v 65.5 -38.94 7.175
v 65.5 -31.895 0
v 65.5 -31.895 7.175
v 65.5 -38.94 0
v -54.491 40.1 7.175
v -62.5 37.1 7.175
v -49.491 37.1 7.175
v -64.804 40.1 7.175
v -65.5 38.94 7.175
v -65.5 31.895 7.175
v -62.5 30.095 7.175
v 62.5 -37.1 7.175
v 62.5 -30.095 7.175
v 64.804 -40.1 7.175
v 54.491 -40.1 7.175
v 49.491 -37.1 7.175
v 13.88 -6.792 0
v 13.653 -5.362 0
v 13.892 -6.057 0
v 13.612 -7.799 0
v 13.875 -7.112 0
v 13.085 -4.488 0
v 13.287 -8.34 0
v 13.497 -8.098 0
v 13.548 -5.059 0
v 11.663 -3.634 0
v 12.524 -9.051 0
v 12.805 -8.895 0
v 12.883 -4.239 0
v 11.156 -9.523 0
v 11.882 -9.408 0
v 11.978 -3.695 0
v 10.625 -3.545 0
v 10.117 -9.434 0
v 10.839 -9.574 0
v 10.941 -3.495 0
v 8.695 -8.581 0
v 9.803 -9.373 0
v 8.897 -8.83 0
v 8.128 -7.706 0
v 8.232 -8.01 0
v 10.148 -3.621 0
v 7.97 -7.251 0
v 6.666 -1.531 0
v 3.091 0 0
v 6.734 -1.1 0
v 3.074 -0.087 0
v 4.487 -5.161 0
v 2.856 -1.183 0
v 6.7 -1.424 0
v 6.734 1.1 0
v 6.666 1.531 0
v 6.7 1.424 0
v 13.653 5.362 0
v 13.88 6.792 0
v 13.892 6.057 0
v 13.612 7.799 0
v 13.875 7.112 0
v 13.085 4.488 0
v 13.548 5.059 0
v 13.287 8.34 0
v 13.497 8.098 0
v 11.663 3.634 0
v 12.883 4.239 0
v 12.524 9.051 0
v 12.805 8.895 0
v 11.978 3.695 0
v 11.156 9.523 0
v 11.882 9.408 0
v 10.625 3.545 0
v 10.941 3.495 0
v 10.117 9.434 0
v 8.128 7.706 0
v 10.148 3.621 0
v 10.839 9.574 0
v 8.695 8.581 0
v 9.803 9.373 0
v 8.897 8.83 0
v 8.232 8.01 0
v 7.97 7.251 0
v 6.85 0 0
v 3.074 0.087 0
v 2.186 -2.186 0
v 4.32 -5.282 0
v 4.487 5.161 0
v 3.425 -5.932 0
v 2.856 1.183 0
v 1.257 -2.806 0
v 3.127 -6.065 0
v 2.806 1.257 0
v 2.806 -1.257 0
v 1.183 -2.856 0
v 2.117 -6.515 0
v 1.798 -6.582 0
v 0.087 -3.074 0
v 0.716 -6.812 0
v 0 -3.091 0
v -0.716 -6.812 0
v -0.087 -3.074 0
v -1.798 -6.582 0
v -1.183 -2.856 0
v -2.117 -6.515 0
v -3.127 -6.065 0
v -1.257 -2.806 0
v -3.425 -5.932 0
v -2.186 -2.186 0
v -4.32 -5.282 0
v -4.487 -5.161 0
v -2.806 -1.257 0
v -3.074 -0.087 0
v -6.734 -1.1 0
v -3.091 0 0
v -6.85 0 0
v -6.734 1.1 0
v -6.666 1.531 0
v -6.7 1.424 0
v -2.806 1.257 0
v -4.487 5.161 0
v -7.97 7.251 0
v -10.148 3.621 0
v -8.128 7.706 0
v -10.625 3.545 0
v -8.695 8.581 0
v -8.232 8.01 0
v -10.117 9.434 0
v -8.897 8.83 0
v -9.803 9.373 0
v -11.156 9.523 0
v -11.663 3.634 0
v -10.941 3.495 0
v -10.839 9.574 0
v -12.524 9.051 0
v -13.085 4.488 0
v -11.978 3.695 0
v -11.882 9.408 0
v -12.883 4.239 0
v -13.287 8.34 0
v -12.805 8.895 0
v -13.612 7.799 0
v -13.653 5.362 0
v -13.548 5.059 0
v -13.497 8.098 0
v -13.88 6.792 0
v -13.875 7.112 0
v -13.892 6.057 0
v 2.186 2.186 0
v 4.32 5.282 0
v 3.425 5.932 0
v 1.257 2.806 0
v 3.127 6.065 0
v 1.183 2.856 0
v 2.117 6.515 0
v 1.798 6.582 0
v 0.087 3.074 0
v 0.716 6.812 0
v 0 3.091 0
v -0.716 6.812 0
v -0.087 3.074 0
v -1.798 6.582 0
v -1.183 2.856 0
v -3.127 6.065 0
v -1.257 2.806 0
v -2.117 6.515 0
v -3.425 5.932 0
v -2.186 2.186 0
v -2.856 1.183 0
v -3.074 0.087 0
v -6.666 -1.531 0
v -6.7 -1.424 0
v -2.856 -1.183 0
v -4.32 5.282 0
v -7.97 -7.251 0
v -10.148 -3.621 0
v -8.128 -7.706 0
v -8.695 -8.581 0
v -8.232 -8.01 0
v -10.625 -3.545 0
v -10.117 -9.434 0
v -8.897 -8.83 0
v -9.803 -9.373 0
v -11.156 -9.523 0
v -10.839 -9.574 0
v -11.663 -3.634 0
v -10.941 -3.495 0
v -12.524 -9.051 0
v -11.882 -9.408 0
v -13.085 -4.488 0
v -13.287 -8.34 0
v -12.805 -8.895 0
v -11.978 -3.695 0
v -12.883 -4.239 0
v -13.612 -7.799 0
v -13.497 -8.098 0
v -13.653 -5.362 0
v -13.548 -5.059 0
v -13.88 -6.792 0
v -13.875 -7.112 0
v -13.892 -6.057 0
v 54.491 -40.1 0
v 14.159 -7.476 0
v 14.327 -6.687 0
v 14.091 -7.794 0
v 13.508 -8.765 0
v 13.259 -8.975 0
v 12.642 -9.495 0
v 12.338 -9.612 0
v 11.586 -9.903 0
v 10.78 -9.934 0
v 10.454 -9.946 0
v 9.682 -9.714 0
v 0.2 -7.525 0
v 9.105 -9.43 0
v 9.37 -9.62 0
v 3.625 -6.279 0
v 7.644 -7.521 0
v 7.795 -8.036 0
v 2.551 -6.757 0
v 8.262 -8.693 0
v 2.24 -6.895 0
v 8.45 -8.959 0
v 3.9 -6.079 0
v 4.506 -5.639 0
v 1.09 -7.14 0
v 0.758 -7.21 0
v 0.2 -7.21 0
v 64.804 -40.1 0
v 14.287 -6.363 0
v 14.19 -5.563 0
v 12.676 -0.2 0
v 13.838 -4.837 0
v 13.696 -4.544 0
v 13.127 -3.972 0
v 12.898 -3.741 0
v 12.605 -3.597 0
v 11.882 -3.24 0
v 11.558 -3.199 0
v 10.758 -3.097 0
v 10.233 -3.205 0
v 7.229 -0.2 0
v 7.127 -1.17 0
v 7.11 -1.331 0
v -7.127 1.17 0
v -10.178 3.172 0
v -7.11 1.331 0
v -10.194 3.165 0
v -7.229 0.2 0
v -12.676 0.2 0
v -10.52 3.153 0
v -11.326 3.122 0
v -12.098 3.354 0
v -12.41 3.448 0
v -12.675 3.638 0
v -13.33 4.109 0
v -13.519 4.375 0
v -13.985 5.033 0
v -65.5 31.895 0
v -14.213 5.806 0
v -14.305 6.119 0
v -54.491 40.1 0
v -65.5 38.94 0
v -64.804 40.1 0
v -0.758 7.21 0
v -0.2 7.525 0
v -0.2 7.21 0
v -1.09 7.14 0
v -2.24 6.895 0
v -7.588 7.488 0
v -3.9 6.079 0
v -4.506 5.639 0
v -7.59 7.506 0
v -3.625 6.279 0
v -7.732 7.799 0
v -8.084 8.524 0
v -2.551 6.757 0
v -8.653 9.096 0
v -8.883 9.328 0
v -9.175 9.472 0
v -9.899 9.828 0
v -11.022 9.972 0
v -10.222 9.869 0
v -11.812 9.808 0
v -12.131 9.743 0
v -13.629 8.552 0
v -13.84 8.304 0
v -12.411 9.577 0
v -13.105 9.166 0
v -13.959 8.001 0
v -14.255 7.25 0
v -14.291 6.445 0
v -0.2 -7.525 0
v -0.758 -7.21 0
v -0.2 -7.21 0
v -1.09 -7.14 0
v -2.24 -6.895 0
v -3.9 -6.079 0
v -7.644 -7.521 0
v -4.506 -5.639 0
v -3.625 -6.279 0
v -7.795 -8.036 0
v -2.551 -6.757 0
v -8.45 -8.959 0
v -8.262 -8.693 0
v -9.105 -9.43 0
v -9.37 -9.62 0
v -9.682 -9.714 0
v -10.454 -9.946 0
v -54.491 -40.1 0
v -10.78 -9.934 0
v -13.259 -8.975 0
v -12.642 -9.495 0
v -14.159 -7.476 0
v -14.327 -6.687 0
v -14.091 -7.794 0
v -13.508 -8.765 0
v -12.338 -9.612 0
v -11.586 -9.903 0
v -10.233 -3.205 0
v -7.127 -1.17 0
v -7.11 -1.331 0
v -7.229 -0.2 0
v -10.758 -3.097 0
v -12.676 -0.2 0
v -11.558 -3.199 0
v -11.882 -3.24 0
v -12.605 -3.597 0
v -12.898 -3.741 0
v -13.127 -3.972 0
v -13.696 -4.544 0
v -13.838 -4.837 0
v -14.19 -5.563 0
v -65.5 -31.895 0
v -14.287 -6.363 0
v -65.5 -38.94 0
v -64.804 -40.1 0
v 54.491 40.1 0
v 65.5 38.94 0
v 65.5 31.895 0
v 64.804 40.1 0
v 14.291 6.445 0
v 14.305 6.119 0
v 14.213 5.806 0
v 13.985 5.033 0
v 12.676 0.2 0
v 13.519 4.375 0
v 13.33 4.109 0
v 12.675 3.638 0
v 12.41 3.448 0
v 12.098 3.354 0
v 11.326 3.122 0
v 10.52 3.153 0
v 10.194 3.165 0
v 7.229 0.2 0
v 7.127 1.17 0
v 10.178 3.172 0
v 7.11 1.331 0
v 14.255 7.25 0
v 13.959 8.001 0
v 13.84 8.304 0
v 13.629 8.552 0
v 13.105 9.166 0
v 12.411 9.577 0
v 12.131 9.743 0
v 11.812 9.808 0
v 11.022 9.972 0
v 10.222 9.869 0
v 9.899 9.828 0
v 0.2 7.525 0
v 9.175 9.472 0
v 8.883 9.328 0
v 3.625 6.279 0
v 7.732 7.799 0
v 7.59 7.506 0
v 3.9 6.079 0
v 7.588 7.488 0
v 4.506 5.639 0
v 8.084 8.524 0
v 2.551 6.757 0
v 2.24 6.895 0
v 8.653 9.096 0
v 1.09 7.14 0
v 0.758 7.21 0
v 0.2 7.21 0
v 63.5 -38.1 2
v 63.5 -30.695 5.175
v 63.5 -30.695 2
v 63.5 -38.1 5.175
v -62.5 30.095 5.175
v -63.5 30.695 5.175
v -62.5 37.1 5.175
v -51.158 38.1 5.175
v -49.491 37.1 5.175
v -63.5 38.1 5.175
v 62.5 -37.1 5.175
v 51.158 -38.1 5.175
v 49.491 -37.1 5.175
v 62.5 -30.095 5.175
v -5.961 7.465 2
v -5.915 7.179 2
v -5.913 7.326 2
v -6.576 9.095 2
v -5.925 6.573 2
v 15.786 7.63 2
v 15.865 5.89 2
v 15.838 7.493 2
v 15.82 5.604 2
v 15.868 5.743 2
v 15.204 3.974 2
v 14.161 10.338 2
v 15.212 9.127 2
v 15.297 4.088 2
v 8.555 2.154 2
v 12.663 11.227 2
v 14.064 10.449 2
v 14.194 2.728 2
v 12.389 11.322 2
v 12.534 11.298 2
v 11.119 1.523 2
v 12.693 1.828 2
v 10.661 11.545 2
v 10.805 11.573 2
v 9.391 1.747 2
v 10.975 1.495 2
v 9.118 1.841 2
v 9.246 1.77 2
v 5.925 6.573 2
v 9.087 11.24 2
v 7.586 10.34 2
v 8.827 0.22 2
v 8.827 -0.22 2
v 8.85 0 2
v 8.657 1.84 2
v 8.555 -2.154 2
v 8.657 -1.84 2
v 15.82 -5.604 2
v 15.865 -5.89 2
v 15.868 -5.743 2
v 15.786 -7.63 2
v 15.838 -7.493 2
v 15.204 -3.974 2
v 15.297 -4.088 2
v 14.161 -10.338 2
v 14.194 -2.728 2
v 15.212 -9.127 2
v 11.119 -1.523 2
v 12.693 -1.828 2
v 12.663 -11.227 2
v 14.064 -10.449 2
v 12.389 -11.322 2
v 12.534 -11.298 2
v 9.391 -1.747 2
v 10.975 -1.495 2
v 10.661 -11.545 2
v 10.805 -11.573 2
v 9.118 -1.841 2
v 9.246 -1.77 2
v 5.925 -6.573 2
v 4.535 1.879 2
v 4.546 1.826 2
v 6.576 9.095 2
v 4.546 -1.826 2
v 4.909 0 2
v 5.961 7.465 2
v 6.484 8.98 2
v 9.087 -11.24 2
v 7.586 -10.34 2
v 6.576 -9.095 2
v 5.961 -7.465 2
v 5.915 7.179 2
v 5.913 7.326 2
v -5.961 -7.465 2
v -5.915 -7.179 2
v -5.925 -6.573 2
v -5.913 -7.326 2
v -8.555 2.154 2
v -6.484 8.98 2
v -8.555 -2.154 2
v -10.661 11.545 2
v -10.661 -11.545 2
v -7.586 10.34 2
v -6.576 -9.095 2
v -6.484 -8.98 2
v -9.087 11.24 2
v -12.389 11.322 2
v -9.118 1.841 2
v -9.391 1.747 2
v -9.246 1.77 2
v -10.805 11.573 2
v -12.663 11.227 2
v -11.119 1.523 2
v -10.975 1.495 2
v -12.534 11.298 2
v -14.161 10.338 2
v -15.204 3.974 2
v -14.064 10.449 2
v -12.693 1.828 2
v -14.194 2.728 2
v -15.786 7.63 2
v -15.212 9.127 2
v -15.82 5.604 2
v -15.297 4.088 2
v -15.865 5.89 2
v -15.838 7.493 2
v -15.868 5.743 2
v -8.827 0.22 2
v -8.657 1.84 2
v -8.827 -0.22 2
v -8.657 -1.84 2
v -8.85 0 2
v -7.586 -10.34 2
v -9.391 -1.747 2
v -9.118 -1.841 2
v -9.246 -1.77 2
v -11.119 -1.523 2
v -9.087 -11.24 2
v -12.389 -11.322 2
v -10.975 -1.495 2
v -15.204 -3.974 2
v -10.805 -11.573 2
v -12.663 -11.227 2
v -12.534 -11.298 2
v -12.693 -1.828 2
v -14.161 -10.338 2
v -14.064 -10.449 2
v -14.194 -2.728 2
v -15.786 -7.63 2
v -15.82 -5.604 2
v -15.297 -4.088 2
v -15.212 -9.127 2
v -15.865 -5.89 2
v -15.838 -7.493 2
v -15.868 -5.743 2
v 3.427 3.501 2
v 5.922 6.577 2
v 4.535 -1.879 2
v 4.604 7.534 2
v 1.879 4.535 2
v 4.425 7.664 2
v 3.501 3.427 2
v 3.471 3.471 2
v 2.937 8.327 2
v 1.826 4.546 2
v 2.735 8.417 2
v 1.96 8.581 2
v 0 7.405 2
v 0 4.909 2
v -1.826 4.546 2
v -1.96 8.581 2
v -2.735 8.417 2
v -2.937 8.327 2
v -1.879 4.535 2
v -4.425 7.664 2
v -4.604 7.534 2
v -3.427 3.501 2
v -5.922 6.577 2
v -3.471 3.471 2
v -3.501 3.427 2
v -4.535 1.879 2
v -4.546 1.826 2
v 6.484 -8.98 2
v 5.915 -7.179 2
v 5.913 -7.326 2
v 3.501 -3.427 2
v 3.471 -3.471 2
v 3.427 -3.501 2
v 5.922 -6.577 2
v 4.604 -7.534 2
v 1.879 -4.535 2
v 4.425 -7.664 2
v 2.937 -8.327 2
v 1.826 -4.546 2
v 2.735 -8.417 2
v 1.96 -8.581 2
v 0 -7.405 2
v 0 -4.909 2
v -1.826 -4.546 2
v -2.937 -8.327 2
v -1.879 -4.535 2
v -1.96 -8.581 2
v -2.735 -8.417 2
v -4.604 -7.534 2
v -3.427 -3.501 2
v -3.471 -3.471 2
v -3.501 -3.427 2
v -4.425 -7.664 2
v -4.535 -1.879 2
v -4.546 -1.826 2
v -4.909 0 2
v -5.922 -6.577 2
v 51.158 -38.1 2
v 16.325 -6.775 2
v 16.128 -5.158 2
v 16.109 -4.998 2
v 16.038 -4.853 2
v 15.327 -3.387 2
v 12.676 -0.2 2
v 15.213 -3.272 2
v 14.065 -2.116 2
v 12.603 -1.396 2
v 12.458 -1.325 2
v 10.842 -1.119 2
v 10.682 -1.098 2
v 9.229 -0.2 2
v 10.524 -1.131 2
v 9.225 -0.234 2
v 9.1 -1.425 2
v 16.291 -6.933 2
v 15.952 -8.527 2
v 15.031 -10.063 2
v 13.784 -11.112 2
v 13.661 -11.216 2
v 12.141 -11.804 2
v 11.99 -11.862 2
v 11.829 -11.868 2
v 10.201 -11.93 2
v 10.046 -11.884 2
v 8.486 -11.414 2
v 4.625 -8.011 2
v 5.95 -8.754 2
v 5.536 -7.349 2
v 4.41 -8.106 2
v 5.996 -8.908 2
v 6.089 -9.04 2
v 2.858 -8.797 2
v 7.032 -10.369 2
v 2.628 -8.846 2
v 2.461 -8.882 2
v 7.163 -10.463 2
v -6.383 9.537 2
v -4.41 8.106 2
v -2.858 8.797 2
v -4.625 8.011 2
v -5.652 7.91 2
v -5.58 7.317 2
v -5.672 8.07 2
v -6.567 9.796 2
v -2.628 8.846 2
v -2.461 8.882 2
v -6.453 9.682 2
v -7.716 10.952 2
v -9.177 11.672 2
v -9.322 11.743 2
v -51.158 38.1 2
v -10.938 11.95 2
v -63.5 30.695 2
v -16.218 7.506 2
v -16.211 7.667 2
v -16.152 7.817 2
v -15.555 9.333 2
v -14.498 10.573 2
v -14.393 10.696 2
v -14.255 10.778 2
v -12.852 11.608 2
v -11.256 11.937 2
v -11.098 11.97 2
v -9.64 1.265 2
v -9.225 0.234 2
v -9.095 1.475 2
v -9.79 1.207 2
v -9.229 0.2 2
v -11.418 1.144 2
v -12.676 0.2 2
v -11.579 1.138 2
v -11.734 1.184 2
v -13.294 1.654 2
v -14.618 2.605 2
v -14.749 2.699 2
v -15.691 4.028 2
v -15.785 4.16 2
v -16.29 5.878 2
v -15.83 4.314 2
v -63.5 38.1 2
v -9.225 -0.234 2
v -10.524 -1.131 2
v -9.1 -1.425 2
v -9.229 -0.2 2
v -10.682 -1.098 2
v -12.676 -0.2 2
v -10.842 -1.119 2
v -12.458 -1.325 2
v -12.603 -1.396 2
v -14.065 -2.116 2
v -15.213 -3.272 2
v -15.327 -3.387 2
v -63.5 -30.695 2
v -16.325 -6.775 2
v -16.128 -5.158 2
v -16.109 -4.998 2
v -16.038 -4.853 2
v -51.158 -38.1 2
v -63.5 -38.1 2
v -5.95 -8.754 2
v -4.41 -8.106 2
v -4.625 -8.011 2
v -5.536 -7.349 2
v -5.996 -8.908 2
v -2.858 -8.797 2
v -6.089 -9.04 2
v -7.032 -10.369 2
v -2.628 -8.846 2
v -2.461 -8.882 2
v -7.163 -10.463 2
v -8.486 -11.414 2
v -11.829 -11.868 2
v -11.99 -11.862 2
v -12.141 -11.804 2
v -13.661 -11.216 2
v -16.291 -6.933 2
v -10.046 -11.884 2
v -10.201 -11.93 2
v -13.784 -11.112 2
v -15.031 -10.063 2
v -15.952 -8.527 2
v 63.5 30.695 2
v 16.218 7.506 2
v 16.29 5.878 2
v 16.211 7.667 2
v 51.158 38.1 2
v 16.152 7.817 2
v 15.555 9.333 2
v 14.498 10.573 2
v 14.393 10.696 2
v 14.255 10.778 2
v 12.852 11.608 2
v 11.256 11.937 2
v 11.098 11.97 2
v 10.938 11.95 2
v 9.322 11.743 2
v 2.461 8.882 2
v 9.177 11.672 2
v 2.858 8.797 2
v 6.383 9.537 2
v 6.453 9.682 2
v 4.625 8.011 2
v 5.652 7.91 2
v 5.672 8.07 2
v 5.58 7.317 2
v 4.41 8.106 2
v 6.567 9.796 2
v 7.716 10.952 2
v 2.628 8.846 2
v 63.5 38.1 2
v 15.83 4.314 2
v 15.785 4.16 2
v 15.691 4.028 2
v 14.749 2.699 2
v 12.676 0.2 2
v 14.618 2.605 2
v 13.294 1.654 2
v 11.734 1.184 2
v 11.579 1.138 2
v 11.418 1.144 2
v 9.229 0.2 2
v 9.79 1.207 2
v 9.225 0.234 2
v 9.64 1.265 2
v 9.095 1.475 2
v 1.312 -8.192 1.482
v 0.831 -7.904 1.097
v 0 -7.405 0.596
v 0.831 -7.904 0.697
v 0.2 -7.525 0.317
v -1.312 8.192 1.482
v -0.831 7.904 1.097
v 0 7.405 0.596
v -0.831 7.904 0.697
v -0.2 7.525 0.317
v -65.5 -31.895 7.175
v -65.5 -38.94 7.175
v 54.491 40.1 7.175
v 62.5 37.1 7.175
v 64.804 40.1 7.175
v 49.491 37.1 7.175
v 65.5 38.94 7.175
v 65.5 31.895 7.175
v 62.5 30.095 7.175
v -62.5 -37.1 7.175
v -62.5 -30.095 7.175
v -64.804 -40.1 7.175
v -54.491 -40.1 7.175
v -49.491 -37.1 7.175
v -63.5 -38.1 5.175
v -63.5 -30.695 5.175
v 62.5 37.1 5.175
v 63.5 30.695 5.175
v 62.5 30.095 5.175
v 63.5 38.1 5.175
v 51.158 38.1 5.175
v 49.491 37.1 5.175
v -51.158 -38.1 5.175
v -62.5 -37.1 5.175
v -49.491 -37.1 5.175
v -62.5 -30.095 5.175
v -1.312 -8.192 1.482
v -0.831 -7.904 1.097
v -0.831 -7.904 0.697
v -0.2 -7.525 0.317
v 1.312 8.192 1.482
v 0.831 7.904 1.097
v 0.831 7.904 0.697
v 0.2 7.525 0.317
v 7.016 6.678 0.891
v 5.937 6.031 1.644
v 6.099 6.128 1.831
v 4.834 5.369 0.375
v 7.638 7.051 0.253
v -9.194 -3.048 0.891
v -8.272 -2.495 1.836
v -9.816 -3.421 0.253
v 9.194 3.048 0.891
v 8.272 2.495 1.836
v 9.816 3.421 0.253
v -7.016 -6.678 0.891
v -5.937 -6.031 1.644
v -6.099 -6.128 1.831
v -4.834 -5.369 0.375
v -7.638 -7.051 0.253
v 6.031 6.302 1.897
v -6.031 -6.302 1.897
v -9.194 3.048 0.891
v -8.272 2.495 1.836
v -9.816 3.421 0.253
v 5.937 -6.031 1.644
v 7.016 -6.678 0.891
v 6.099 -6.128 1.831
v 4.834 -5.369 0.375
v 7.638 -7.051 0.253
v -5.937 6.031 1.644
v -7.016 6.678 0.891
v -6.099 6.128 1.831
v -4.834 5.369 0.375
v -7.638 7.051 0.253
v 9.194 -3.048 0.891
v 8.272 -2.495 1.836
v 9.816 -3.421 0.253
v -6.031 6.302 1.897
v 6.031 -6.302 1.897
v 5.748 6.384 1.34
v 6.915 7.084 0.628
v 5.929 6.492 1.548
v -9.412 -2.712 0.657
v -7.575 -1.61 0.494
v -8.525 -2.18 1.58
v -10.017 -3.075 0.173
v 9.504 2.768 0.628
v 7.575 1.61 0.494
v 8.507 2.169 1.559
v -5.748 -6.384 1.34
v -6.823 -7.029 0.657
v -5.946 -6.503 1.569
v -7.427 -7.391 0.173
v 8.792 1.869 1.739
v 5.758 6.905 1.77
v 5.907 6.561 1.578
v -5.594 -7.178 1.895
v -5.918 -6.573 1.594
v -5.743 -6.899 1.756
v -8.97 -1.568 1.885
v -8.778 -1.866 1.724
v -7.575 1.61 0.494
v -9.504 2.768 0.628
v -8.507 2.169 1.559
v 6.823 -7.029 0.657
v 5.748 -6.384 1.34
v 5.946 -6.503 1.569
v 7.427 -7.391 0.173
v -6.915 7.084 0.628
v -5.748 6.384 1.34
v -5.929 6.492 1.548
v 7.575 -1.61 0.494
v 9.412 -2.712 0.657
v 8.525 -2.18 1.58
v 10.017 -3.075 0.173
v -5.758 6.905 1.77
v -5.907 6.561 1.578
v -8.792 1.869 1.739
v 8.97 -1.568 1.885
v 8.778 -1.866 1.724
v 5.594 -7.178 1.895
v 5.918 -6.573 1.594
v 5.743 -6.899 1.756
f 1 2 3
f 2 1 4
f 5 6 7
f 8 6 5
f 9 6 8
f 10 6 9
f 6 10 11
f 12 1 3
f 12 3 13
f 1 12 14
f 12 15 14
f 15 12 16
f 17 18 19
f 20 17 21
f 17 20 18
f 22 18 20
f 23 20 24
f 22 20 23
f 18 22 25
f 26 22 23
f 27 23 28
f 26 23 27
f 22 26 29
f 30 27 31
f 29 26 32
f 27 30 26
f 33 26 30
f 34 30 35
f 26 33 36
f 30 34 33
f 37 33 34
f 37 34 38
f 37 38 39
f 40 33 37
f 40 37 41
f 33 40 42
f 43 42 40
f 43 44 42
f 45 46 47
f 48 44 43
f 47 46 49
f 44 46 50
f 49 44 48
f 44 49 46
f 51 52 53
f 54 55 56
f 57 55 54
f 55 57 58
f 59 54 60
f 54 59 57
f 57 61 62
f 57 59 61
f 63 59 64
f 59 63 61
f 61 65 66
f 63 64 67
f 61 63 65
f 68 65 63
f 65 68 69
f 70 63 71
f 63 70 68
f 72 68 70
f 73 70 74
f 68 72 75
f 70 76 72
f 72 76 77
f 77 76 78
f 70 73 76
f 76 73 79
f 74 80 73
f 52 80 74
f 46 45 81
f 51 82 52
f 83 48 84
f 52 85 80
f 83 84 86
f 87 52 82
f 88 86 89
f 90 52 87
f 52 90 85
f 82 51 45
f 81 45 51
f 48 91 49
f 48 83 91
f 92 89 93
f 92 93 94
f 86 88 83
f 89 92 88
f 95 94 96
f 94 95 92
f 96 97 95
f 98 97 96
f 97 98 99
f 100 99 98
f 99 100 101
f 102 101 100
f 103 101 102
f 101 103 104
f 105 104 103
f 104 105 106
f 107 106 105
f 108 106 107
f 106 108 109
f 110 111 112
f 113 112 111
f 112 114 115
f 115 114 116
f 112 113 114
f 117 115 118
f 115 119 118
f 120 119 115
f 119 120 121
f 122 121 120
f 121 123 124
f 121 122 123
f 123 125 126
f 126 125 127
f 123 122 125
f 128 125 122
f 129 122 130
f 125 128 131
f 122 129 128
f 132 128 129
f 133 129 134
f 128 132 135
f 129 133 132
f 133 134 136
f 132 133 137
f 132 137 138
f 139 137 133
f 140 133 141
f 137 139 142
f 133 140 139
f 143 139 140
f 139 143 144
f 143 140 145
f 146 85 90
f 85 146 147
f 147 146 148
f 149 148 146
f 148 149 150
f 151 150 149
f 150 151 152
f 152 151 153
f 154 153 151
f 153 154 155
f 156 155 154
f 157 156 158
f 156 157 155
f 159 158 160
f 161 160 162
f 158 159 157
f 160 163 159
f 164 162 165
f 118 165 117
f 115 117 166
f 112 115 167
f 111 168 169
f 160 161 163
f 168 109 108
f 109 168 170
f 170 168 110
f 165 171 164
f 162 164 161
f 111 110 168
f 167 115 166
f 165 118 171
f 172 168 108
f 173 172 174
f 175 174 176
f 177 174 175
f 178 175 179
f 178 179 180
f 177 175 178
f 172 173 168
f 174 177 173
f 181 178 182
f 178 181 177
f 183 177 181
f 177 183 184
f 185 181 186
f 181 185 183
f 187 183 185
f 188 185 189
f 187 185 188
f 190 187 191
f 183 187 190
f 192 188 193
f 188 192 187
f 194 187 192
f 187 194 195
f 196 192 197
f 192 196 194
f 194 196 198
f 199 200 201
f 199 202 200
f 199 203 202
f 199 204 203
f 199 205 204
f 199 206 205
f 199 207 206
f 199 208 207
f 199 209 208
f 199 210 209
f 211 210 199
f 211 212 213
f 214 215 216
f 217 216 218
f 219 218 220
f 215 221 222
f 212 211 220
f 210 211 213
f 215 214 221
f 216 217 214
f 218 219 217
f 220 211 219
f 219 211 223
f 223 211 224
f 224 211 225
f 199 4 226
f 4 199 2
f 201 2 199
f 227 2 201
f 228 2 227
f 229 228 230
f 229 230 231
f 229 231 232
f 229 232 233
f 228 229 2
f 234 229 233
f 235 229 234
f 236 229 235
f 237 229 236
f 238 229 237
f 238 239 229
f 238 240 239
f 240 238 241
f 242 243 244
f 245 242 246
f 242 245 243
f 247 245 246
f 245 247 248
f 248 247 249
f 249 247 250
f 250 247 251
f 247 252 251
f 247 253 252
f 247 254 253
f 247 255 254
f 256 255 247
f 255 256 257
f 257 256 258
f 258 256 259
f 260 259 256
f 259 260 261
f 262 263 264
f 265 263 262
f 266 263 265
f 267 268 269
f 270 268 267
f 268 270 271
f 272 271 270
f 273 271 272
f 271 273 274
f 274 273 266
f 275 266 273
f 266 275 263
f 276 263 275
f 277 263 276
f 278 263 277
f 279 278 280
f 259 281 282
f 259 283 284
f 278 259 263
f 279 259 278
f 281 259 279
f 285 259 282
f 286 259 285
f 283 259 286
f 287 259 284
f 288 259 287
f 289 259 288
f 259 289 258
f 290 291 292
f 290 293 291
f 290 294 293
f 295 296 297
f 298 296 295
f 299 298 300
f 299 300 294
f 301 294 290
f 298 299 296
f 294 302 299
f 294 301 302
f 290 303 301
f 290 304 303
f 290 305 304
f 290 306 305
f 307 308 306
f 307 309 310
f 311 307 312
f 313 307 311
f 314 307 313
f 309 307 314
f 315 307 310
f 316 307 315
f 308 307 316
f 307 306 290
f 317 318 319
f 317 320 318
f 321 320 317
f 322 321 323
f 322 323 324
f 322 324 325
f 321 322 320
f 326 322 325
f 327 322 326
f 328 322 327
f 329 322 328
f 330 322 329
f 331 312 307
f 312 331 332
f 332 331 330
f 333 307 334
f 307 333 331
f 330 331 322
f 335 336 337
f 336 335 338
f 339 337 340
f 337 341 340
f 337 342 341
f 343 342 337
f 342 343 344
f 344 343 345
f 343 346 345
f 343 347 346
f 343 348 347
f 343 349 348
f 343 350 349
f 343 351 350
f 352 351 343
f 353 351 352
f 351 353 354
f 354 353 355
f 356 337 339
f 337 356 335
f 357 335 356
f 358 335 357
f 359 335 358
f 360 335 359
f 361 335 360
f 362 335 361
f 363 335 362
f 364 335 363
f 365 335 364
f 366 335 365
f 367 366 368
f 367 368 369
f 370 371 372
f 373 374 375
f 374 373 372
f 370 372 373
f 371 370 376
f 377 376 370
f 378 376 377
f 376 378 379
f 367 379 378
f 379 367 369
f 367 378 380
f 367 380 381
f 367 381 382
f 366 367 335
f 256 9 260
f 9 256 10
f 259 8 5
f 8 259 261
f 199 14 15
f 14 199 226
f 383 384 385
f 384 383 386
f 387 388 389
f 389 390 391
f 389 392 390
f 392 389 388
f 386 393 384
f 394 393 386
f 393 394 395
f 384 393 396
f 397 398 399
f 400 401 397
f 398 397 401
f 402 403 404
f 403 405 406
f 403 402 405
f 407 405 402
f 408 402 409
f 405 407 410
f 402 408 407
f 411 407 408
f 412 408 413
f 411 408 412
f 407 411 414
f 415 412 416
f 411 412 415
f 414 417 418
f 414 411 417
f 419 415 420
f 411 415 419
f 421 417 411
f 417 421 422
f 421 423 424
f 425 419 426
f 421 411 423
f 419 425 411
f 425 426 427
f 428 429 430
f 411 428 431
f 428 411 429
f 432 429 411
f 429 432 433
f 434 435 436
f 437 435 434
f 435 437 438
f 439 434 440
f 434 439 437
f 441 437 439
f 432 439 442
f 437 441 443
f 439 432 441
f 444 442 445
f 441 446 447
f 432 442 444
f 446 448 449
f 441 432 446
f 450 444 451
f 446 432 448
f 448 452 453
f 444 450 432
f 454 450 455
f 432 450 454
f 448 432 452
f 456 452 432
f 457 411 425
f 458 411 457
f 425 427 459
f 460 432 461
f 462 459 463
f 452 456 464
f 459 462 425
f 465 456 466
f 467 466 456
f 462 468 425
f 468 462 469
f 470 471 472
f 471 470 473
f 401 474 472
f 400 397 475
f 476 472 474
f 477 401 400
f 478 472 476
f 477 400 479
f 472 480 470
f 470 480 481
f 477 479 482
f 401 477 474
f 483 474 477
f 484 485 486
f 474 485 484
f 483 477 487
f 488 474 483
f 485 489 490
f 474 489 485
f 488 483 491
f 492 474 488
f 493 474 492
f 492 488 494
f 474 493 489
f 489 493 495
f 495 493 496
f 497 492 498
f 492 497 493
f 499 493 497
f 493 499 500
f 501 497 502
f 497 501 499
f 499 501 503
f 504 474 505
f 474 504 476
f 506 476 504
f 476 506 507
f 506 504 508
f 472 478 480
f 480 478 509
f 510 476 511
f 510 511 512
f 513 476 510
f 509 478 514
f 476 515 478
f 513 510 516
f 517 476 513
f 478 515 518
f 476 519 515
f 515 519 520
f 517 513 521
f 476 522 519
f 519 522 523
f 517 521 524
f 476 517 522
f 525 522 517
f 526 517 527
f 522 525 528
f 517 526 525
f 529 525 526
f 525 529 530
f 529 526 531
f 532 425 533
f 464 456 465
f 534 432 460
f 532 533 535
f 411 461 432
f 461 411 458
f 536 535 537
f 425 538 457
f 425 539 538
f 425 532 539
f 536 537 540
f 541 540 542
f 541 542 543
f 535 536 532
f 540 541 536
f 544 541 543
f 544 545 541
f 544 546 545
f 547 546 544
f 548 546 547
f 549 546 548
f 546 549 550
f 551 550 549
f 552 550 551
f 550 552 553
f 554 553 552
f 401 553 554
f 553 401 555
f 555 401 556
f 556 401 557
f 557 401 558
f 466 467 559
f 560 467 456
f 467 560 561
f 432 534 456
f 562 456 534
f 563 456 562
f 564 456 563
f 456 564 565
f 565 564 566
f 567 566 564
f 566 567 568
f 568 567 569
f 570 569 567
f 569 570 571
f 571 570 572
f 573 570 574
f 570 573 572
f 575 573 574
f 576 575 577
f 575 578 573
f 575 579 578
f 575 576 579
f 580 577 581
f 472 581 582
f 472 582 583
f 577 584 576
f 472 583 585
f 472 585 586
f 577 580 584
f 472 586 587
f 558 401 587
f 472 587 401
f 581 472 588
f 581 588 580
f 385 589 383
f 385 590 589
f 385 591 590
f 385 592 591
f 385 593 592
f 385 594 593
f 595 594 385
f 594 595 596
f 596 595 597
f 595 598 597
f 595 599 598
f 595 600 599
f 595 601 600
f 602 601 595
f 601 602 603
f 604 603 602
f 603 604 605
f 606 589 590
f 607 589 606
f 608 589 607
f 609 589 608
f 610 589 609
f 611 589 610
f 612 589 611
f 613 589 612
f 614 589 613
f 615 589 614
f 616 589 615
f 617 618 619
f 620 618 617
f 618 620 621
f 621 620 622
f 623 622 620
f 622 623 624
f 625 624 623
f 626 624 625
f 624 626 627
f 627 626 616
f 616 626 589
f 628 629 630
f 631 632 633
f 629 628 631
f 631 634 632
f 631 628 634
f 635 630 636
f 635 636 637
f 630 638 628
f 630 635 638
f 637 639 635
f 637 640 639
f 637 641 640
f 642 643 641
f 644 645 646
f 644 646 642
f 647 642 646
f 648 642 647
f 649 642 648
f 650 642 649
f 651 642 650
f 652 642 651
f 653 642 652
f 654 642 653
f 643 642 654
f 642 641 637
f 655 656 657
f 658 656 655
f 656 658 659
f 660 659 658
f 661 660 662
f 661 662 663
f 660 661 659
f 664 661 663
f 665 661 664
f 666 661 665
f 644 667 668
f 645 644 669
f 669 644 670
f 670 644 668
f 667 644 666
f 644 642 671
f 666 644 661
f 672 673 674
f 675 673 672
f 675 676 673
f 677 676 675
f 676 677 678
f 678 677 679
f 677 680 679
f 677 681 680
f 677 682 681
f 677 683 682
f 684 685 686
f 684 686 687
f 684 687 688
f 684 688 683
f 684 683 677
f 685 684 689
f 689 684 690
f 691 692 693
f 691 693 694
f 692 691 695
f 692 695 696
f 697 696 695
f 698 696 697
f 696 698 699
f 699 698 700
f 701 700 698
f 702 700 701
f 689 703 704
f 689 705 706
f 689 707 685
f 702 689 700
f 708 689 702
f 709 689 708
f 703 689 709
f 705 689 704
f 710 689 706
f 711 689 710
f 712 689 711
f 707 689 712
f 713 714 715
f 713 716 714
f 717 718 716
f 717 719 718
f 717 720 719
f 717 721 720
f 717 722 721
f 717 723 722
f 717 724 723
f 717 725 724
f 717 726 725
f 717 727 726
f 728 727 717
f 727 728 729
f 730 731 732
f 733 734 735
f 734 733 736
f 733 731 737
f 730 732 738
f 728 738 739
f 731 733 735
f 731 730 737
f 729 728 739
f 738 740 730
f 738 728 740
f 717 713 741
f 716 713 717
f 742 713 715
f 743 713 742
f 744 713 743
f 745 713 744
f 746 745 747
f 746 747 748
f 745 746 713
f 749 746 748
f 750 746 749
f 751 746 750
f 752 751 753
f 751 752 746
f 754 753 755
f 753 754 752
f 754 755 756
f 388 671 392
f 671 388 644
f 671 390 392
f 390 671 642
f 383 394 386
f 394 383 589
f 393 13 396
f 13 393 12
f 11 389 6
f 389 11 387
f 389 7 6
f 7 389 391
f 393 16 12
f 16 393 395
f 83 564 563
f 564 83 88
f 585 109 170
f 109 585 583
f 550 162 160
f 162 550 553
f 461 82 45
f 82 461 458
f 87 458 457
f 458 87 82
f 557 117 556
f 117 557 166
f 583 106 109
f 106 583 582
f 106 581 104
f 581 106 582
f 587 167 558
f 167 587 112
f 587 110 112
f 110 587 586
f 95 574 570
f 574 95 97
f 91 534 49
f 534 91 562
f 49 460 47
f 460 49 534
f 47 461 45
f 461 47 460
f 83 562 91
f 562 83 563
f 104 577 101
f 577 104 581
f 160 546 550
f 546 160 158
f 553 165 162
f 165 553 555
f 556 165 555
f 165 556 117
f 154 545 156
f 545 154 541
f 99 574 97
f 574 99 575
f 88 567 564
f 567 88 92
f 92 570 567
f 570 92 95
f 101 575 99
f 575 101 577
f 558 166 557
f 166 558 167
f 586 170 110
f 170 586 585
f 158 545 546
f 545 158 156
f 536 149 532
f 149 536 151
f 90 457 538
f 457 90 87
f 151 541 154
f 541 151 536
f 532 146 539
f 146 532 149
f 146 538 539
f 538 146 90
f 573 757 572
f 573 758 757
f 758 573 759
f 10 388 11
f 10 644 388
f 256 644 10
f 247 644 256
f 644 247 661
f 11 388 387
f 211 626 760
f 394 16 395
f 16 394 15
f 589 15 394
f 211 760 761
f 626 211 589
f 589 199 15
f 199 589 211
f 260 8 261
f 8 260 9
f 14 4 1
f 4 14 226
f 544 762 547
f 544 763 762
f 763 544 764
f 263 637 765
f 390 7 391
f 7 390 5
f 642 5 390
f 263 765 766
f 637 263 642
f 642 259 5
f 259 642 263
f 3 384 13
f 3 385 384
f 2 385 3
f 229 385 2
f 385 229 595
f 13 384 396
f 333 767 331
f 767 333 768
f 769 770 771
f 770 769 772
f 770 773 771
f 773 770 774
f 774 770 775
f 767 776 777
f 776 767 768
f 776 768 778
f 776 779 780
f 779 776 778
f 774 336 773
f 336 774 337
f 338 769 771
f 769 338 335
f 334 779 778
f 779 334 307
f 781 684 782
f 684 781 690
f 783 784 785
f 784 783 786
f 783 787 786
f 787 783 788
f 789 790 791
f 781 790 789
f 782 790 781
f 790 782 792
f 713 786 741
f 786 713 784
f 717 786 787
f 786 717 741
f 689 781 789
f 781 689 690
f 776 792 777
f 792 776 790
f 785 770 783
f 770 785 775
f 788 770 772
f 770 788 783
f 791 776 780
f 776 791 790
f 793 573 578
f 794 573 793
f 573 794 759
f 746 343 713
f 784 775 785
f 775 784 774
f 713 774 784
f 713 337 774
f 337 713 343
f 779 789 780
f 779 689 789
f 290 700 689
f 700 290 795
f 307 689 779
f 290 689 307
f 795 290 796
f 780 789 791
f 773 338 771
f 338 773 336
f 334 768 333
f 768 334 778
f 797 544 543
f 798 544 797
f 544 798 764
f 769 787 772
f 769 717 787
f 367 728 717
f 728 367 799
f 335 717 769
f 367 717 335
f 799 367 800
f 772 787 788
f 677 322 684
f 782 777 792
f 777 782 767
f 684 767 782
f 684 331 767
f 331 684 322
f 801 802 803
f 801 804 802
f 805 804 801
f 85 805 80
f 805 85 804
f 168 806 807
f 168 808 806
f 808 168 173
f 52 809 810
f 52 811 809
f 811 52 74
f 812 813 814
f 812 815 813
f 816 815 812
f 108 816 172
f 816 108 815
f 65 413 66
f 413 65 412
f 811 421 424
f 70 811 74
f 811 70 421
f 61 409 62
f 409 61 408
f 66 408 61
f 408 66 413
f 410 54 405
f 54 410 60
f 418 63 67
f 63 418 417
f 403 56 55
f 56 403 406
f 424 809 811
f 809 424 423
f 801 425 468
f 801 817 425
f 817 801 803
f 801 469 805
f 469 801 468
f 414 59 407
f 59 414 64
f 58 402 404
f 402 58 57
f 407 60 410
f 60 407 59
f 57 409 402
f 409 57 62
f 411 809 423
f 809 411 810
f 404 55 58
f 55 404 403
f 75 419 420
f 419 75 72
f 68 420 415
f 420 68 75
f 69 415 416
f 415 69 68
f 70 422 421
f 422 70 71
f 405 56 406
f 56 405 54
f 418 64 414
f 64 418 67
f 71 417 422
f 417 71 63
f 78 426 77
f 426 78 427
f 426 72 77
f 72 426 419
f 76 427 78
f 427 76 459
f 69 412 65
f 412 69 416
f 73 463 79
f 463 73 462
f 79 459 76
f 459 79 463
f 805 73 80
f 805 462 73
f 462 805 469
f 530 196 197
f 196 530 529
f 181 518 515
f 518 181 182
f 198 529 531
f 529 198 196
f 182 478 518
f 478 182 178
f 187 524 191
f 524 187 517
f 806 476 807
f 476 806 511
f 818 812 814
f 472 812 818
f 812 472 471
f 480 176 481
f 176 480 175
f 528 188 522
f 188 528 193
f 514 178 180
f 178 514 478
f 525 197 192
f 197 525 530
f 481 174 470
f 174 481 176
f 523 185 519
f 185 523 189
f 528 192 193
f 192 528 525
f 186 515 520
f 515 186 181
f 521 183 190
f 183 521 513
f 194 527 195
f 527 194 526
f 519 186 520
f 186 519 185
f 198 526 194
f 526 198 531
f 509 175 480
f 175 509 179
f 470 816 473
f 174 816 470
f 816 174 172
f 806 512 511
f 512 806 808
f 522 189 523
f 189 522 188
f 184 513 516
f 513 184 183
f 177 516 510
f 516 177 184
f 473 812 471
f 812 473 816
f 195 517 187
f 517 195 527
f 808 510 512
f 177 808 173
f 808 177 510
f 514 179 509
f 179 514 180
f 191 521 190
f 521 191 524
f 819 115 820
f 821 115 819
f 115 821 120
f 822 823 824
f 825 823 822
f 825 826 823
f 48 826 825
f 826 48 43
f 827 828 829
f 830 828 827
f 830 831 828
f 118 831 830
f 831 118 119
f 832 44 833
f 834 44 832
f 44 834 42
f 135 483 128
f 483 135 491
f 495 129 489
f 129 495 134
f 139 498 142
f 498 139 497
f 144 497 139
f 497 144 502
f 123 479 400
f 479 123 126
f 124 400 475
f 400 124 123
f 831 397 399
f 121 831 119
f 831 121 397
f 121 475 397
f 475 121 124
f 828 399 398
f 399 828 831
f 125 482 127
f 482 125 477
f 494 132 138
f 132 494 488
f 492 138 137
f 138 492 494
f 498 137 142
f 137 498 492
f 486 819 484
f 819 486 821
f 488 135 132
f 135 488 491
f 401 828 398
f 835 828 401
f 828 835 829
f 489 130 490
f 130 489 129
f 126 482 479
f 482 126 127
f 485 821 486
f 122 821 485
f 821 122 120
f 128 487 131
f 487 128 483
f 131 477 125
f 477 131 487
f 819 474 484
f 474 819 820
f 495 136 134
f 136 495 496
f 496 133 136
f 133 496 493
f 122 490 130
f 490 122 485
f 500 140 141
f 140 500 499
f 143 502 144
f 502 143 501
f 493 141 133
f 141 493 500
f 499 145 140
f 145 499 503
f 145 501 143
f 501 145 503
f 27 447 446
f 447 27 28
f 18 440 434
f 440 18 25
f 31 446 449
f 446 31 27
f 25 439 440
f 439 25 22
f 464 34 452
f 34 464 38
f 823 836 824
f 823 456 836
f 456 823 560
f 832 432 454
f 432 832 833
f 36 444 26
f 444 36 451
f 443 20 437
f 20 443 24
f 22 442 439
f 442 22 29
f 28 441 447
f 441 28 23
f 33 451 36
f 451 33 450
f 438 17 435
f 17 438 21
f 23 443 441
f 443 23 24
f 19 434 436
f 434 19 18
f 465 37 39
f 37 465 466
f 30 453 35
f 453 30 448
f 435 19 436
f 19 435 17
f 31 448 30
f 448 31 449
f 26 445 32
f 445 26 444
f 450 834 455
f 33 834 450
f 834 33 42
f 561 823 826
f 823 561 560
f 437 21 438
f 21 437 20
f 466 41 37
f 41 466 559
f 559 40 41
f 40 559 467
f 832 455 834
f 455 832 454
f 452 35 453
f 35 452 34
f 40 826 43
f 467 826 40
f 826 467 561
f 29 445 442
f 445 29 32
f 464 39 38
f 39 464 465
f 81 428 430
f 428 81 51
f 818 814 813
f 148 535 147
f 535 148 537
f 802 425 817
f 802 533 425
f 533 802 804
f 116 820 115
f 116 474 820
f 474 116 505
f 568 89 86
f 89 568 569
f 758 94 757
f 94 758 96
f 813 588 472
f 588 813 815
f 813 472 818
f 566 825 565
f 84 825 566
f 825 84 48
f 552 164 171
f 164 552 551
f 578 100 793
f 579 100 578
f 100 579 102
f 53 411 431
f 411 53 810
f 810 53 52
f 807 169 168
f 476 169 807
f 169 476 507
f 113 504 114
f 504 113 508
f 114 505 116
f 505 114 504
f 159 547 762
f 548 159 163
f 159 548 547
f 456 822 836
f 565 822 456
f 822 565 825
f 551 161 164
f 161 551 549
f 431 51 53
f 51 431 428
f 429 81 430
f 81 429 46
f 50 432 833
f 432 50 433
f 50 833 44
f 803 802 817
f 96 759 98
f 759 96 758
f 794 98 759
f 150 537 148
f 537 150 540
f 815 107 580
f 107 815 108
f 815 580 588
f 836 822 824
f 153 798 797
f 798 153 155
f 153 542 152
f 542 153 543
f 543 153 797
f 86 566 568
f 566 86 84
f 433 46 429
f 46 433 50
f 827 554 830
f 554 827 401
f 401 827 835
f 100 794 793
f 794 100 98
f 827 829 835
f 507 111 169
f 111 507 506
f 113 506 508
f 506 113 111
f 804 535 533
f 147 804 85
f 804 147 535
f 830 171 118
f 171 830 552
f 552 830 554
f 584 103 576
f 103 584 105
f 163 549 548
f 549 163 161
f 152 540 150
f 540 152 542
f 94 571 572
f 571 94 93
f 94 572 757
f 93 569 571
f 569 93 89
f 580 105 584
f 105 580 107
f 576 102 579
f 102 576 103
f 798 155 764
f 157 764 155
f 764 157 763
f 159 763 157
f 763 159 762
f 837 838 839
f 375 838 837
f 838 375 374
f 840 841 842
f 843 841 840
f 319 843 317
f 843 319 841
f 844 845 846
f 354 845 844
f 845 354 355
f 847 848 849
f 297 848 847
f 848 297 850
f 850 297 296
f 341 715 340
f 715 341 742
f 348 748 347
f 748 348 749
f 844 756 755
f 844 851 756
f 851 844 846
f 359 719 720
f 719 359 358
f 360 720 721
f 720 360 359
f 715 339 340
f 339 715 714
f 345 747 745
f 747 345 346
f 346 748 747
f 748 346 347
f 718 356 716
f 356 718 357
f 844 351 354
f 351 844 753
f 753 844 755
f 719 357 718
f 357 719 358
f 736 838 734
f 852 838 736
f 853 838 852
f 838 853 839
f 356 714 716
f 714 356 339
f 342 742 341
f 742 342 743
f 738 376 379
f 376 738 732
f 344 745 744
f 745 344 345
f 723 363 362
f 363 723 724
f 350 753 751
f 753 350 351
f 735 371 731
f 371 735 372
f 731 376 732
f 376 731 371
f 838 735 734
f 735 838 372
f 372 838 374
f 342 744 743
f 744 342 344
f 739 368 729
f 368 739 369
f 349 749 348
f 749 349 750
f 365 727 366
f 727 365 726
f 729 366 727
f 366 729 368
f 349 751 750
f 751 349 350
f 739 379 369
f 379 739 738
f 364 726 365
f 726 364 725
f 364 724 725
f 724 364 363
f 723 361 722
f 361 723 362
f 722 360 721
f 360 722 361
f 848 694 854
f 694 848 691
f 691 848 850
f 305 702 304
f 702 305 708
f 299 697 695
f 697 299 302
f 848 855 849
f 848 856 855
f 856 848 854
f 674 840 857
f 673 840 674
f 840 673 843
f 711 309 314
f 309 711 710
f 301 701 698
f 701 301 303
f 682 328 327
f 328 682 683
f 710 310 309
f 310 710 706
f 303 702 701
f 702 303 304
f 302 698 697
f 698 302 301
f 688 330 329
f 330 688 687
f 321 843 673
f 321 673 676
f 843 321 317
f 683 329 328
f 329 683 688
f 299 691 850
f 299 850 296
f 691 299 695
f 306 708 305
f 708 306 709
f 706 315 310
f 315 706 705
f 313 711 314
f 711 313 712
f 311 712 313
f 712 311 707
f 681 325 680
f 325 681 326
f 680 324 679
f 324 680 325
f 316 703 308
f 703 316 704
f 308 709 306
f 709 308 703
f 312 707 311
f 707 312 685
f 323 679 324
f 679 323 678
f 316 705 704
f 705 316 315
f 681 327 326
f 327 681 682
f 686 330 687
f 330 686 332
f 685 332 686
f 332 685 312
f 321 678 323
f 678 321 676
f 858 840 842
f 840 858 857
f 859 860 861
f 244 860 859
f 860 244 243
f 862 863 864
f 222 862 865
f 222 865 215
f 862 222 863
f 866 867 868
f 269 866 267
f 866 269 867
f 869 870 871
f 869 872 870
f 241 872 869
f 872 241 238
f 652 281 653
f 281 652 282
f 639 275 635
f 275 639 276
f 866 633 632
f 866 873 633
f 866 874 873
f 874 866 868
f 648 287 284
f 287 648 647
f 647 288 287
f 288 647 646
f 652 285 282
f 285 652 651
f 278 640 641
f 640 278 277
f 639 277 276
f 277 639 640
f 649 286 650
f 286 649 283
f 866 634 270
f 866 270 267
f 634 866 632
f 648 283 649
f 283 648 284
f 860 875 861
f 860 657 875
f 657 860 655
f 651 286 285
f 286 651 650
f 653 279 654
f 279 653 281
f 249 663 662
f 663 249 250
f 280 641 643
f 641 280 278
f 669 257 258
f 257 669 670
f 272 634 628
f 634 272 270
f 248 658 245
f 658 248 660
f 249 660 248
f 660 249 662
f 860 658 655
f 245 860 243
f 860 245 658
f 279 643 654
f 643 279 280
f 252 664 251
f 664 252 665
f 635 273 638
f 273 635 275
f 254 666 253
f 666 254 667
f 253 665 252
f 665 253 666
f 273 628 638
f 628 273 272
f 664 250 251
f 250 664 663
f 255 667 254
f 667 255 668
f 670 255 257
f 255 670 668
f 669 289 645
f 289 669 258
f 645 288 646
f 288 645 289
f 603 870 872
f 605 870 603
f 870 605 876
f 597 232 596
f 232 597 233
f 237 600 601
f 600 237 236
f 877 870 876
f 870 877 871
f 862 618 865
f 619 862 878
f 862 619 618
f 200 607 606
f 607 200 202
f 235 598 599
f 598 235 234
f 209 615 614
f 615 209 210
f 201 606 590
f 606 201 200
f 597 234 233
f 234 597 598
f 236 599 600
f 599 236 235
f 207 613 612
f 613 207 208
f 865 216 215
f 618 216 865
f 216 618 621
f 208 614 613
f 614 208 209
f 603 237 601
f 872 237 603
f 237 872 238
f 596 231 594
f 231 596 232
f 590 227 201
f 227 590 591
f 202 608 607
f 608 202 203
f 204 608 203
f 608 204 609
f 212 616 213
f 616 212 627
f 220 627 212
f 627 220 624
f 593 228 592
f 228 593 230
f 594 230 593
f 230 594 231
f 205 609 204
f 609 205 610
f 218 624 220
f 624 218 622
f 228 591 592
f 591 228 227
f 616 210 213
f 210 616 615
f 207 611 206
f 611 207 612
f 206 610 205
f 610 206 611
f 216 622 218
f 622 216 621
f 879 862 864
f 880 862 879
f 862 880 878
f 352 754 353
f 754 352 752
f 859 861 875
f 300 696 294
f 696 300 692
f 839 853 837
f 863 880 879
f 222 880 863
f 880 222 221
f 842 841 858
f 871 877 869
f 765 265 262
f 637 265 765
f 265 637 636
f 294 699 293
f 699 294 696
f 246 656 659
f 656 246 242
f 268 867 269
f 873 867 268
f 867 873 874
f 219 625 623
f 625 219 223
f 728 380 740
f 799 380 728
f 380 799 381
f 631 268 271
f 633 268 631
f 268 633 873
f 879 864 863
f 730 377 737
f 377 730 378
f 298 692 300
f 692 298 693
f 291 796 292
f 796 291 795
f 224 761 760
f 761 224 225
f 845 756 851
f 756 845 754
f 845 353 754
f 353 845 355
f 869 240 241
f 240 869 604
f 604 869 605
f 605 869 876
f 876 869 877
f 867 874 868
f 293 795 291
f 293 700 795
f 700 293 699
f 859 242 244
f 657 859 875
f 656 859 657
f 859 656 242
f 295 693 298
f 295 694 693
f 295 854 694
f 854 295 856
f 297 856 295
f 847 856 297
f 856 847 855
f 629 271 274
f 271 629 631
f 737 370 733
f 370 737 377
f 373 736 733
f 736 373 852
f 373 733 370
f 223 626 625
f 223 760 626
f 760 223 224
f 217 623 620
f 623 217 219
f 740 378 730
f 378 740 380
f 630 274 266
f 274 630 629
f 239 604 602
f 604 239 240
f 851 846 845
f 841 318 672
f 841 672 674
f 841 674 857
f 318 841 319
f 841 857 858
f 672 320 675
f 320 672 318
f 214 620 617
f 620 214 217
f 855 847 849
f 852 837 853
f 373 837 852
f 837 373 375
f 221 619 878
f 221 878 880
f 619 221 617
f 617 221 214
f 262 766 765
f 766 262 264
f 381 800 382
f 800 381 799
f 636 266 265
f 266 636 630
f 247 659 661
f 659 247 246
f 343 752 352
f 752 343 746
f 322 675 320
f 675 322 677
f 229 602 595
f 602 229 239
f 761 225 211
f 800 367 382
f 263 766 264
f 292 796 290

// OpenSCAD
// 8.5 x 11 paper holder

/* [Frame Dimensions] */

// Assembled or plated or individual parts?
part = 0; //[0:Preview, 1:Plate, 2:Center, 3:Left arm, 4:Right arm]

in = 25.4*1;
// Thickness of holder in mm
thick = 2;

// Paper width in inches or mm (use one)
widthInches = 5;
widthMM = 0;
// Paper height in inches or mm (use one)
heightInches = 3;
heightMM = 0;
// Paper thickness in inches or mm (use one)
thicknessInches = .125;
thicknessMM = 0;
// Arm width in inches or mm (use one)
armInches = .5;
armMM = 0;
band = armInches*in+armMM;

x=widthInches*in+widthMM;
y=heightInches*in+heightMM;
z=thicknessInches*in+thicknessMM;

r = x/y;
angle=atan(r);

xi = x-band/2;
yi=y-band/2;
xi=x;
yi=y;

diag = sqrt(xi*xi+yi*yi);

// Radius of center screw in mm
sr = 3;
// Gap for spacing between parts (tune for your printer)
gap=0.4;

spacing = 1.1*band;

module arm() {
intersection() {
	rotate([0,0,angle]) cube([band,2*y,z+3*thick], center=true);
	difference() {
		cube([x+2*thick,y+2*thick,z+2*thick],center=true);
		cube([x,y,z], center=true);
		translate([0,0,z/2]) cube([x-2,y-2,z+thick], center=true);
		translate([0,0,-(z/2+thick)-.1]) cylinder(r1=sr, r2=sr+thick, h=thick+.2);
		}
	}
}

module X () {
	arm();
	mirror([1,0,0]) arm();
	}

module plug(r, h) {
	//echo(r,h);
	cylinder(r1=r, r2=r+h, h=h, center=true);
	}

module centerCut() {
	translate([0,0,-z/2-thick/2]) {
		rotate([0,0,90-angle]) {
			cube([2*band,band/3,thick+1], center=true);
			translate([band,0,0]) plug(band/5,thick+1);
			translate([-band,0,0]) plug(band/5,thick+1);
			}
		rotate([0,0,90+angle]) {
			cube([2*band,band/3,thick+1], center=true);
			translate([band,0,0]) plug(band/5,thick+1);
			translate([-band,0,0]) plug(band/5,thick+1);
			}
		plug(band/2,thick+1);
		}
	}

module centerHole() {
	translate([0,0,-z/2-thick/2]) {
		rotate([0,0,90-angle]) {
			cube([2*band+2*gap,band/3+2*gap,thick+1], center=true);
			translate([band,0,0]) plug(band/5+gap,thick+1);
			translate([-band,0,0]) plug(band/5+gap,thick+1);
			}
		rotate([0,0,90+angle]) {
			cube([2*band+2*gap,band/3+2*gap,thick+1], center=true);
			translate([band,0,0]) plug(band/5+gap,thick+1);
			translate([-band,0,0]) plug(band/5+gap,thick+1);
			}
		plug(band/2+gap,thick+1);
		}
	cube([x,gap,band], center=true);
	cube([gap,y,band], center=true);;
	}

module center() {
	intersection () {
		X();
		centerCut();
		}
	}

module anArm() {
    ht=z+2*thick;
	intersection() {
		difference() {
			X();
			centerHole();
			}
		translate([0,0,-ht/2]) cube([x/2+thick,y/2+thick,ht]);
		}
	}

module plate() {
	translate([-spacing/2,-band,0]) rotate([0,0,90]) center();
	rotate([0,0,angle]) anArm();
	translate([spacing,0,0]) rotate([0,0,angle]) anArm();
	translate([-spacing,0,0]) mirror([1,0,0]) rotate([0,0,angle]) anArm();
	translate([-2*spacing,0,0]) mirror([1,0,0]) rotate([0,0,angle]) anArm();
	}

module preview() {
	center();
	difference() {
			X();
			centerHole();
			}
		}

translate([0,0,z/2+thick]) {
	if (part==0) preview();
	if (part==1) plate();
	if (part==2) center();
	if (part==3) anArm();
	if (part==4) mirror([1,0,0]) anArm();
	}
